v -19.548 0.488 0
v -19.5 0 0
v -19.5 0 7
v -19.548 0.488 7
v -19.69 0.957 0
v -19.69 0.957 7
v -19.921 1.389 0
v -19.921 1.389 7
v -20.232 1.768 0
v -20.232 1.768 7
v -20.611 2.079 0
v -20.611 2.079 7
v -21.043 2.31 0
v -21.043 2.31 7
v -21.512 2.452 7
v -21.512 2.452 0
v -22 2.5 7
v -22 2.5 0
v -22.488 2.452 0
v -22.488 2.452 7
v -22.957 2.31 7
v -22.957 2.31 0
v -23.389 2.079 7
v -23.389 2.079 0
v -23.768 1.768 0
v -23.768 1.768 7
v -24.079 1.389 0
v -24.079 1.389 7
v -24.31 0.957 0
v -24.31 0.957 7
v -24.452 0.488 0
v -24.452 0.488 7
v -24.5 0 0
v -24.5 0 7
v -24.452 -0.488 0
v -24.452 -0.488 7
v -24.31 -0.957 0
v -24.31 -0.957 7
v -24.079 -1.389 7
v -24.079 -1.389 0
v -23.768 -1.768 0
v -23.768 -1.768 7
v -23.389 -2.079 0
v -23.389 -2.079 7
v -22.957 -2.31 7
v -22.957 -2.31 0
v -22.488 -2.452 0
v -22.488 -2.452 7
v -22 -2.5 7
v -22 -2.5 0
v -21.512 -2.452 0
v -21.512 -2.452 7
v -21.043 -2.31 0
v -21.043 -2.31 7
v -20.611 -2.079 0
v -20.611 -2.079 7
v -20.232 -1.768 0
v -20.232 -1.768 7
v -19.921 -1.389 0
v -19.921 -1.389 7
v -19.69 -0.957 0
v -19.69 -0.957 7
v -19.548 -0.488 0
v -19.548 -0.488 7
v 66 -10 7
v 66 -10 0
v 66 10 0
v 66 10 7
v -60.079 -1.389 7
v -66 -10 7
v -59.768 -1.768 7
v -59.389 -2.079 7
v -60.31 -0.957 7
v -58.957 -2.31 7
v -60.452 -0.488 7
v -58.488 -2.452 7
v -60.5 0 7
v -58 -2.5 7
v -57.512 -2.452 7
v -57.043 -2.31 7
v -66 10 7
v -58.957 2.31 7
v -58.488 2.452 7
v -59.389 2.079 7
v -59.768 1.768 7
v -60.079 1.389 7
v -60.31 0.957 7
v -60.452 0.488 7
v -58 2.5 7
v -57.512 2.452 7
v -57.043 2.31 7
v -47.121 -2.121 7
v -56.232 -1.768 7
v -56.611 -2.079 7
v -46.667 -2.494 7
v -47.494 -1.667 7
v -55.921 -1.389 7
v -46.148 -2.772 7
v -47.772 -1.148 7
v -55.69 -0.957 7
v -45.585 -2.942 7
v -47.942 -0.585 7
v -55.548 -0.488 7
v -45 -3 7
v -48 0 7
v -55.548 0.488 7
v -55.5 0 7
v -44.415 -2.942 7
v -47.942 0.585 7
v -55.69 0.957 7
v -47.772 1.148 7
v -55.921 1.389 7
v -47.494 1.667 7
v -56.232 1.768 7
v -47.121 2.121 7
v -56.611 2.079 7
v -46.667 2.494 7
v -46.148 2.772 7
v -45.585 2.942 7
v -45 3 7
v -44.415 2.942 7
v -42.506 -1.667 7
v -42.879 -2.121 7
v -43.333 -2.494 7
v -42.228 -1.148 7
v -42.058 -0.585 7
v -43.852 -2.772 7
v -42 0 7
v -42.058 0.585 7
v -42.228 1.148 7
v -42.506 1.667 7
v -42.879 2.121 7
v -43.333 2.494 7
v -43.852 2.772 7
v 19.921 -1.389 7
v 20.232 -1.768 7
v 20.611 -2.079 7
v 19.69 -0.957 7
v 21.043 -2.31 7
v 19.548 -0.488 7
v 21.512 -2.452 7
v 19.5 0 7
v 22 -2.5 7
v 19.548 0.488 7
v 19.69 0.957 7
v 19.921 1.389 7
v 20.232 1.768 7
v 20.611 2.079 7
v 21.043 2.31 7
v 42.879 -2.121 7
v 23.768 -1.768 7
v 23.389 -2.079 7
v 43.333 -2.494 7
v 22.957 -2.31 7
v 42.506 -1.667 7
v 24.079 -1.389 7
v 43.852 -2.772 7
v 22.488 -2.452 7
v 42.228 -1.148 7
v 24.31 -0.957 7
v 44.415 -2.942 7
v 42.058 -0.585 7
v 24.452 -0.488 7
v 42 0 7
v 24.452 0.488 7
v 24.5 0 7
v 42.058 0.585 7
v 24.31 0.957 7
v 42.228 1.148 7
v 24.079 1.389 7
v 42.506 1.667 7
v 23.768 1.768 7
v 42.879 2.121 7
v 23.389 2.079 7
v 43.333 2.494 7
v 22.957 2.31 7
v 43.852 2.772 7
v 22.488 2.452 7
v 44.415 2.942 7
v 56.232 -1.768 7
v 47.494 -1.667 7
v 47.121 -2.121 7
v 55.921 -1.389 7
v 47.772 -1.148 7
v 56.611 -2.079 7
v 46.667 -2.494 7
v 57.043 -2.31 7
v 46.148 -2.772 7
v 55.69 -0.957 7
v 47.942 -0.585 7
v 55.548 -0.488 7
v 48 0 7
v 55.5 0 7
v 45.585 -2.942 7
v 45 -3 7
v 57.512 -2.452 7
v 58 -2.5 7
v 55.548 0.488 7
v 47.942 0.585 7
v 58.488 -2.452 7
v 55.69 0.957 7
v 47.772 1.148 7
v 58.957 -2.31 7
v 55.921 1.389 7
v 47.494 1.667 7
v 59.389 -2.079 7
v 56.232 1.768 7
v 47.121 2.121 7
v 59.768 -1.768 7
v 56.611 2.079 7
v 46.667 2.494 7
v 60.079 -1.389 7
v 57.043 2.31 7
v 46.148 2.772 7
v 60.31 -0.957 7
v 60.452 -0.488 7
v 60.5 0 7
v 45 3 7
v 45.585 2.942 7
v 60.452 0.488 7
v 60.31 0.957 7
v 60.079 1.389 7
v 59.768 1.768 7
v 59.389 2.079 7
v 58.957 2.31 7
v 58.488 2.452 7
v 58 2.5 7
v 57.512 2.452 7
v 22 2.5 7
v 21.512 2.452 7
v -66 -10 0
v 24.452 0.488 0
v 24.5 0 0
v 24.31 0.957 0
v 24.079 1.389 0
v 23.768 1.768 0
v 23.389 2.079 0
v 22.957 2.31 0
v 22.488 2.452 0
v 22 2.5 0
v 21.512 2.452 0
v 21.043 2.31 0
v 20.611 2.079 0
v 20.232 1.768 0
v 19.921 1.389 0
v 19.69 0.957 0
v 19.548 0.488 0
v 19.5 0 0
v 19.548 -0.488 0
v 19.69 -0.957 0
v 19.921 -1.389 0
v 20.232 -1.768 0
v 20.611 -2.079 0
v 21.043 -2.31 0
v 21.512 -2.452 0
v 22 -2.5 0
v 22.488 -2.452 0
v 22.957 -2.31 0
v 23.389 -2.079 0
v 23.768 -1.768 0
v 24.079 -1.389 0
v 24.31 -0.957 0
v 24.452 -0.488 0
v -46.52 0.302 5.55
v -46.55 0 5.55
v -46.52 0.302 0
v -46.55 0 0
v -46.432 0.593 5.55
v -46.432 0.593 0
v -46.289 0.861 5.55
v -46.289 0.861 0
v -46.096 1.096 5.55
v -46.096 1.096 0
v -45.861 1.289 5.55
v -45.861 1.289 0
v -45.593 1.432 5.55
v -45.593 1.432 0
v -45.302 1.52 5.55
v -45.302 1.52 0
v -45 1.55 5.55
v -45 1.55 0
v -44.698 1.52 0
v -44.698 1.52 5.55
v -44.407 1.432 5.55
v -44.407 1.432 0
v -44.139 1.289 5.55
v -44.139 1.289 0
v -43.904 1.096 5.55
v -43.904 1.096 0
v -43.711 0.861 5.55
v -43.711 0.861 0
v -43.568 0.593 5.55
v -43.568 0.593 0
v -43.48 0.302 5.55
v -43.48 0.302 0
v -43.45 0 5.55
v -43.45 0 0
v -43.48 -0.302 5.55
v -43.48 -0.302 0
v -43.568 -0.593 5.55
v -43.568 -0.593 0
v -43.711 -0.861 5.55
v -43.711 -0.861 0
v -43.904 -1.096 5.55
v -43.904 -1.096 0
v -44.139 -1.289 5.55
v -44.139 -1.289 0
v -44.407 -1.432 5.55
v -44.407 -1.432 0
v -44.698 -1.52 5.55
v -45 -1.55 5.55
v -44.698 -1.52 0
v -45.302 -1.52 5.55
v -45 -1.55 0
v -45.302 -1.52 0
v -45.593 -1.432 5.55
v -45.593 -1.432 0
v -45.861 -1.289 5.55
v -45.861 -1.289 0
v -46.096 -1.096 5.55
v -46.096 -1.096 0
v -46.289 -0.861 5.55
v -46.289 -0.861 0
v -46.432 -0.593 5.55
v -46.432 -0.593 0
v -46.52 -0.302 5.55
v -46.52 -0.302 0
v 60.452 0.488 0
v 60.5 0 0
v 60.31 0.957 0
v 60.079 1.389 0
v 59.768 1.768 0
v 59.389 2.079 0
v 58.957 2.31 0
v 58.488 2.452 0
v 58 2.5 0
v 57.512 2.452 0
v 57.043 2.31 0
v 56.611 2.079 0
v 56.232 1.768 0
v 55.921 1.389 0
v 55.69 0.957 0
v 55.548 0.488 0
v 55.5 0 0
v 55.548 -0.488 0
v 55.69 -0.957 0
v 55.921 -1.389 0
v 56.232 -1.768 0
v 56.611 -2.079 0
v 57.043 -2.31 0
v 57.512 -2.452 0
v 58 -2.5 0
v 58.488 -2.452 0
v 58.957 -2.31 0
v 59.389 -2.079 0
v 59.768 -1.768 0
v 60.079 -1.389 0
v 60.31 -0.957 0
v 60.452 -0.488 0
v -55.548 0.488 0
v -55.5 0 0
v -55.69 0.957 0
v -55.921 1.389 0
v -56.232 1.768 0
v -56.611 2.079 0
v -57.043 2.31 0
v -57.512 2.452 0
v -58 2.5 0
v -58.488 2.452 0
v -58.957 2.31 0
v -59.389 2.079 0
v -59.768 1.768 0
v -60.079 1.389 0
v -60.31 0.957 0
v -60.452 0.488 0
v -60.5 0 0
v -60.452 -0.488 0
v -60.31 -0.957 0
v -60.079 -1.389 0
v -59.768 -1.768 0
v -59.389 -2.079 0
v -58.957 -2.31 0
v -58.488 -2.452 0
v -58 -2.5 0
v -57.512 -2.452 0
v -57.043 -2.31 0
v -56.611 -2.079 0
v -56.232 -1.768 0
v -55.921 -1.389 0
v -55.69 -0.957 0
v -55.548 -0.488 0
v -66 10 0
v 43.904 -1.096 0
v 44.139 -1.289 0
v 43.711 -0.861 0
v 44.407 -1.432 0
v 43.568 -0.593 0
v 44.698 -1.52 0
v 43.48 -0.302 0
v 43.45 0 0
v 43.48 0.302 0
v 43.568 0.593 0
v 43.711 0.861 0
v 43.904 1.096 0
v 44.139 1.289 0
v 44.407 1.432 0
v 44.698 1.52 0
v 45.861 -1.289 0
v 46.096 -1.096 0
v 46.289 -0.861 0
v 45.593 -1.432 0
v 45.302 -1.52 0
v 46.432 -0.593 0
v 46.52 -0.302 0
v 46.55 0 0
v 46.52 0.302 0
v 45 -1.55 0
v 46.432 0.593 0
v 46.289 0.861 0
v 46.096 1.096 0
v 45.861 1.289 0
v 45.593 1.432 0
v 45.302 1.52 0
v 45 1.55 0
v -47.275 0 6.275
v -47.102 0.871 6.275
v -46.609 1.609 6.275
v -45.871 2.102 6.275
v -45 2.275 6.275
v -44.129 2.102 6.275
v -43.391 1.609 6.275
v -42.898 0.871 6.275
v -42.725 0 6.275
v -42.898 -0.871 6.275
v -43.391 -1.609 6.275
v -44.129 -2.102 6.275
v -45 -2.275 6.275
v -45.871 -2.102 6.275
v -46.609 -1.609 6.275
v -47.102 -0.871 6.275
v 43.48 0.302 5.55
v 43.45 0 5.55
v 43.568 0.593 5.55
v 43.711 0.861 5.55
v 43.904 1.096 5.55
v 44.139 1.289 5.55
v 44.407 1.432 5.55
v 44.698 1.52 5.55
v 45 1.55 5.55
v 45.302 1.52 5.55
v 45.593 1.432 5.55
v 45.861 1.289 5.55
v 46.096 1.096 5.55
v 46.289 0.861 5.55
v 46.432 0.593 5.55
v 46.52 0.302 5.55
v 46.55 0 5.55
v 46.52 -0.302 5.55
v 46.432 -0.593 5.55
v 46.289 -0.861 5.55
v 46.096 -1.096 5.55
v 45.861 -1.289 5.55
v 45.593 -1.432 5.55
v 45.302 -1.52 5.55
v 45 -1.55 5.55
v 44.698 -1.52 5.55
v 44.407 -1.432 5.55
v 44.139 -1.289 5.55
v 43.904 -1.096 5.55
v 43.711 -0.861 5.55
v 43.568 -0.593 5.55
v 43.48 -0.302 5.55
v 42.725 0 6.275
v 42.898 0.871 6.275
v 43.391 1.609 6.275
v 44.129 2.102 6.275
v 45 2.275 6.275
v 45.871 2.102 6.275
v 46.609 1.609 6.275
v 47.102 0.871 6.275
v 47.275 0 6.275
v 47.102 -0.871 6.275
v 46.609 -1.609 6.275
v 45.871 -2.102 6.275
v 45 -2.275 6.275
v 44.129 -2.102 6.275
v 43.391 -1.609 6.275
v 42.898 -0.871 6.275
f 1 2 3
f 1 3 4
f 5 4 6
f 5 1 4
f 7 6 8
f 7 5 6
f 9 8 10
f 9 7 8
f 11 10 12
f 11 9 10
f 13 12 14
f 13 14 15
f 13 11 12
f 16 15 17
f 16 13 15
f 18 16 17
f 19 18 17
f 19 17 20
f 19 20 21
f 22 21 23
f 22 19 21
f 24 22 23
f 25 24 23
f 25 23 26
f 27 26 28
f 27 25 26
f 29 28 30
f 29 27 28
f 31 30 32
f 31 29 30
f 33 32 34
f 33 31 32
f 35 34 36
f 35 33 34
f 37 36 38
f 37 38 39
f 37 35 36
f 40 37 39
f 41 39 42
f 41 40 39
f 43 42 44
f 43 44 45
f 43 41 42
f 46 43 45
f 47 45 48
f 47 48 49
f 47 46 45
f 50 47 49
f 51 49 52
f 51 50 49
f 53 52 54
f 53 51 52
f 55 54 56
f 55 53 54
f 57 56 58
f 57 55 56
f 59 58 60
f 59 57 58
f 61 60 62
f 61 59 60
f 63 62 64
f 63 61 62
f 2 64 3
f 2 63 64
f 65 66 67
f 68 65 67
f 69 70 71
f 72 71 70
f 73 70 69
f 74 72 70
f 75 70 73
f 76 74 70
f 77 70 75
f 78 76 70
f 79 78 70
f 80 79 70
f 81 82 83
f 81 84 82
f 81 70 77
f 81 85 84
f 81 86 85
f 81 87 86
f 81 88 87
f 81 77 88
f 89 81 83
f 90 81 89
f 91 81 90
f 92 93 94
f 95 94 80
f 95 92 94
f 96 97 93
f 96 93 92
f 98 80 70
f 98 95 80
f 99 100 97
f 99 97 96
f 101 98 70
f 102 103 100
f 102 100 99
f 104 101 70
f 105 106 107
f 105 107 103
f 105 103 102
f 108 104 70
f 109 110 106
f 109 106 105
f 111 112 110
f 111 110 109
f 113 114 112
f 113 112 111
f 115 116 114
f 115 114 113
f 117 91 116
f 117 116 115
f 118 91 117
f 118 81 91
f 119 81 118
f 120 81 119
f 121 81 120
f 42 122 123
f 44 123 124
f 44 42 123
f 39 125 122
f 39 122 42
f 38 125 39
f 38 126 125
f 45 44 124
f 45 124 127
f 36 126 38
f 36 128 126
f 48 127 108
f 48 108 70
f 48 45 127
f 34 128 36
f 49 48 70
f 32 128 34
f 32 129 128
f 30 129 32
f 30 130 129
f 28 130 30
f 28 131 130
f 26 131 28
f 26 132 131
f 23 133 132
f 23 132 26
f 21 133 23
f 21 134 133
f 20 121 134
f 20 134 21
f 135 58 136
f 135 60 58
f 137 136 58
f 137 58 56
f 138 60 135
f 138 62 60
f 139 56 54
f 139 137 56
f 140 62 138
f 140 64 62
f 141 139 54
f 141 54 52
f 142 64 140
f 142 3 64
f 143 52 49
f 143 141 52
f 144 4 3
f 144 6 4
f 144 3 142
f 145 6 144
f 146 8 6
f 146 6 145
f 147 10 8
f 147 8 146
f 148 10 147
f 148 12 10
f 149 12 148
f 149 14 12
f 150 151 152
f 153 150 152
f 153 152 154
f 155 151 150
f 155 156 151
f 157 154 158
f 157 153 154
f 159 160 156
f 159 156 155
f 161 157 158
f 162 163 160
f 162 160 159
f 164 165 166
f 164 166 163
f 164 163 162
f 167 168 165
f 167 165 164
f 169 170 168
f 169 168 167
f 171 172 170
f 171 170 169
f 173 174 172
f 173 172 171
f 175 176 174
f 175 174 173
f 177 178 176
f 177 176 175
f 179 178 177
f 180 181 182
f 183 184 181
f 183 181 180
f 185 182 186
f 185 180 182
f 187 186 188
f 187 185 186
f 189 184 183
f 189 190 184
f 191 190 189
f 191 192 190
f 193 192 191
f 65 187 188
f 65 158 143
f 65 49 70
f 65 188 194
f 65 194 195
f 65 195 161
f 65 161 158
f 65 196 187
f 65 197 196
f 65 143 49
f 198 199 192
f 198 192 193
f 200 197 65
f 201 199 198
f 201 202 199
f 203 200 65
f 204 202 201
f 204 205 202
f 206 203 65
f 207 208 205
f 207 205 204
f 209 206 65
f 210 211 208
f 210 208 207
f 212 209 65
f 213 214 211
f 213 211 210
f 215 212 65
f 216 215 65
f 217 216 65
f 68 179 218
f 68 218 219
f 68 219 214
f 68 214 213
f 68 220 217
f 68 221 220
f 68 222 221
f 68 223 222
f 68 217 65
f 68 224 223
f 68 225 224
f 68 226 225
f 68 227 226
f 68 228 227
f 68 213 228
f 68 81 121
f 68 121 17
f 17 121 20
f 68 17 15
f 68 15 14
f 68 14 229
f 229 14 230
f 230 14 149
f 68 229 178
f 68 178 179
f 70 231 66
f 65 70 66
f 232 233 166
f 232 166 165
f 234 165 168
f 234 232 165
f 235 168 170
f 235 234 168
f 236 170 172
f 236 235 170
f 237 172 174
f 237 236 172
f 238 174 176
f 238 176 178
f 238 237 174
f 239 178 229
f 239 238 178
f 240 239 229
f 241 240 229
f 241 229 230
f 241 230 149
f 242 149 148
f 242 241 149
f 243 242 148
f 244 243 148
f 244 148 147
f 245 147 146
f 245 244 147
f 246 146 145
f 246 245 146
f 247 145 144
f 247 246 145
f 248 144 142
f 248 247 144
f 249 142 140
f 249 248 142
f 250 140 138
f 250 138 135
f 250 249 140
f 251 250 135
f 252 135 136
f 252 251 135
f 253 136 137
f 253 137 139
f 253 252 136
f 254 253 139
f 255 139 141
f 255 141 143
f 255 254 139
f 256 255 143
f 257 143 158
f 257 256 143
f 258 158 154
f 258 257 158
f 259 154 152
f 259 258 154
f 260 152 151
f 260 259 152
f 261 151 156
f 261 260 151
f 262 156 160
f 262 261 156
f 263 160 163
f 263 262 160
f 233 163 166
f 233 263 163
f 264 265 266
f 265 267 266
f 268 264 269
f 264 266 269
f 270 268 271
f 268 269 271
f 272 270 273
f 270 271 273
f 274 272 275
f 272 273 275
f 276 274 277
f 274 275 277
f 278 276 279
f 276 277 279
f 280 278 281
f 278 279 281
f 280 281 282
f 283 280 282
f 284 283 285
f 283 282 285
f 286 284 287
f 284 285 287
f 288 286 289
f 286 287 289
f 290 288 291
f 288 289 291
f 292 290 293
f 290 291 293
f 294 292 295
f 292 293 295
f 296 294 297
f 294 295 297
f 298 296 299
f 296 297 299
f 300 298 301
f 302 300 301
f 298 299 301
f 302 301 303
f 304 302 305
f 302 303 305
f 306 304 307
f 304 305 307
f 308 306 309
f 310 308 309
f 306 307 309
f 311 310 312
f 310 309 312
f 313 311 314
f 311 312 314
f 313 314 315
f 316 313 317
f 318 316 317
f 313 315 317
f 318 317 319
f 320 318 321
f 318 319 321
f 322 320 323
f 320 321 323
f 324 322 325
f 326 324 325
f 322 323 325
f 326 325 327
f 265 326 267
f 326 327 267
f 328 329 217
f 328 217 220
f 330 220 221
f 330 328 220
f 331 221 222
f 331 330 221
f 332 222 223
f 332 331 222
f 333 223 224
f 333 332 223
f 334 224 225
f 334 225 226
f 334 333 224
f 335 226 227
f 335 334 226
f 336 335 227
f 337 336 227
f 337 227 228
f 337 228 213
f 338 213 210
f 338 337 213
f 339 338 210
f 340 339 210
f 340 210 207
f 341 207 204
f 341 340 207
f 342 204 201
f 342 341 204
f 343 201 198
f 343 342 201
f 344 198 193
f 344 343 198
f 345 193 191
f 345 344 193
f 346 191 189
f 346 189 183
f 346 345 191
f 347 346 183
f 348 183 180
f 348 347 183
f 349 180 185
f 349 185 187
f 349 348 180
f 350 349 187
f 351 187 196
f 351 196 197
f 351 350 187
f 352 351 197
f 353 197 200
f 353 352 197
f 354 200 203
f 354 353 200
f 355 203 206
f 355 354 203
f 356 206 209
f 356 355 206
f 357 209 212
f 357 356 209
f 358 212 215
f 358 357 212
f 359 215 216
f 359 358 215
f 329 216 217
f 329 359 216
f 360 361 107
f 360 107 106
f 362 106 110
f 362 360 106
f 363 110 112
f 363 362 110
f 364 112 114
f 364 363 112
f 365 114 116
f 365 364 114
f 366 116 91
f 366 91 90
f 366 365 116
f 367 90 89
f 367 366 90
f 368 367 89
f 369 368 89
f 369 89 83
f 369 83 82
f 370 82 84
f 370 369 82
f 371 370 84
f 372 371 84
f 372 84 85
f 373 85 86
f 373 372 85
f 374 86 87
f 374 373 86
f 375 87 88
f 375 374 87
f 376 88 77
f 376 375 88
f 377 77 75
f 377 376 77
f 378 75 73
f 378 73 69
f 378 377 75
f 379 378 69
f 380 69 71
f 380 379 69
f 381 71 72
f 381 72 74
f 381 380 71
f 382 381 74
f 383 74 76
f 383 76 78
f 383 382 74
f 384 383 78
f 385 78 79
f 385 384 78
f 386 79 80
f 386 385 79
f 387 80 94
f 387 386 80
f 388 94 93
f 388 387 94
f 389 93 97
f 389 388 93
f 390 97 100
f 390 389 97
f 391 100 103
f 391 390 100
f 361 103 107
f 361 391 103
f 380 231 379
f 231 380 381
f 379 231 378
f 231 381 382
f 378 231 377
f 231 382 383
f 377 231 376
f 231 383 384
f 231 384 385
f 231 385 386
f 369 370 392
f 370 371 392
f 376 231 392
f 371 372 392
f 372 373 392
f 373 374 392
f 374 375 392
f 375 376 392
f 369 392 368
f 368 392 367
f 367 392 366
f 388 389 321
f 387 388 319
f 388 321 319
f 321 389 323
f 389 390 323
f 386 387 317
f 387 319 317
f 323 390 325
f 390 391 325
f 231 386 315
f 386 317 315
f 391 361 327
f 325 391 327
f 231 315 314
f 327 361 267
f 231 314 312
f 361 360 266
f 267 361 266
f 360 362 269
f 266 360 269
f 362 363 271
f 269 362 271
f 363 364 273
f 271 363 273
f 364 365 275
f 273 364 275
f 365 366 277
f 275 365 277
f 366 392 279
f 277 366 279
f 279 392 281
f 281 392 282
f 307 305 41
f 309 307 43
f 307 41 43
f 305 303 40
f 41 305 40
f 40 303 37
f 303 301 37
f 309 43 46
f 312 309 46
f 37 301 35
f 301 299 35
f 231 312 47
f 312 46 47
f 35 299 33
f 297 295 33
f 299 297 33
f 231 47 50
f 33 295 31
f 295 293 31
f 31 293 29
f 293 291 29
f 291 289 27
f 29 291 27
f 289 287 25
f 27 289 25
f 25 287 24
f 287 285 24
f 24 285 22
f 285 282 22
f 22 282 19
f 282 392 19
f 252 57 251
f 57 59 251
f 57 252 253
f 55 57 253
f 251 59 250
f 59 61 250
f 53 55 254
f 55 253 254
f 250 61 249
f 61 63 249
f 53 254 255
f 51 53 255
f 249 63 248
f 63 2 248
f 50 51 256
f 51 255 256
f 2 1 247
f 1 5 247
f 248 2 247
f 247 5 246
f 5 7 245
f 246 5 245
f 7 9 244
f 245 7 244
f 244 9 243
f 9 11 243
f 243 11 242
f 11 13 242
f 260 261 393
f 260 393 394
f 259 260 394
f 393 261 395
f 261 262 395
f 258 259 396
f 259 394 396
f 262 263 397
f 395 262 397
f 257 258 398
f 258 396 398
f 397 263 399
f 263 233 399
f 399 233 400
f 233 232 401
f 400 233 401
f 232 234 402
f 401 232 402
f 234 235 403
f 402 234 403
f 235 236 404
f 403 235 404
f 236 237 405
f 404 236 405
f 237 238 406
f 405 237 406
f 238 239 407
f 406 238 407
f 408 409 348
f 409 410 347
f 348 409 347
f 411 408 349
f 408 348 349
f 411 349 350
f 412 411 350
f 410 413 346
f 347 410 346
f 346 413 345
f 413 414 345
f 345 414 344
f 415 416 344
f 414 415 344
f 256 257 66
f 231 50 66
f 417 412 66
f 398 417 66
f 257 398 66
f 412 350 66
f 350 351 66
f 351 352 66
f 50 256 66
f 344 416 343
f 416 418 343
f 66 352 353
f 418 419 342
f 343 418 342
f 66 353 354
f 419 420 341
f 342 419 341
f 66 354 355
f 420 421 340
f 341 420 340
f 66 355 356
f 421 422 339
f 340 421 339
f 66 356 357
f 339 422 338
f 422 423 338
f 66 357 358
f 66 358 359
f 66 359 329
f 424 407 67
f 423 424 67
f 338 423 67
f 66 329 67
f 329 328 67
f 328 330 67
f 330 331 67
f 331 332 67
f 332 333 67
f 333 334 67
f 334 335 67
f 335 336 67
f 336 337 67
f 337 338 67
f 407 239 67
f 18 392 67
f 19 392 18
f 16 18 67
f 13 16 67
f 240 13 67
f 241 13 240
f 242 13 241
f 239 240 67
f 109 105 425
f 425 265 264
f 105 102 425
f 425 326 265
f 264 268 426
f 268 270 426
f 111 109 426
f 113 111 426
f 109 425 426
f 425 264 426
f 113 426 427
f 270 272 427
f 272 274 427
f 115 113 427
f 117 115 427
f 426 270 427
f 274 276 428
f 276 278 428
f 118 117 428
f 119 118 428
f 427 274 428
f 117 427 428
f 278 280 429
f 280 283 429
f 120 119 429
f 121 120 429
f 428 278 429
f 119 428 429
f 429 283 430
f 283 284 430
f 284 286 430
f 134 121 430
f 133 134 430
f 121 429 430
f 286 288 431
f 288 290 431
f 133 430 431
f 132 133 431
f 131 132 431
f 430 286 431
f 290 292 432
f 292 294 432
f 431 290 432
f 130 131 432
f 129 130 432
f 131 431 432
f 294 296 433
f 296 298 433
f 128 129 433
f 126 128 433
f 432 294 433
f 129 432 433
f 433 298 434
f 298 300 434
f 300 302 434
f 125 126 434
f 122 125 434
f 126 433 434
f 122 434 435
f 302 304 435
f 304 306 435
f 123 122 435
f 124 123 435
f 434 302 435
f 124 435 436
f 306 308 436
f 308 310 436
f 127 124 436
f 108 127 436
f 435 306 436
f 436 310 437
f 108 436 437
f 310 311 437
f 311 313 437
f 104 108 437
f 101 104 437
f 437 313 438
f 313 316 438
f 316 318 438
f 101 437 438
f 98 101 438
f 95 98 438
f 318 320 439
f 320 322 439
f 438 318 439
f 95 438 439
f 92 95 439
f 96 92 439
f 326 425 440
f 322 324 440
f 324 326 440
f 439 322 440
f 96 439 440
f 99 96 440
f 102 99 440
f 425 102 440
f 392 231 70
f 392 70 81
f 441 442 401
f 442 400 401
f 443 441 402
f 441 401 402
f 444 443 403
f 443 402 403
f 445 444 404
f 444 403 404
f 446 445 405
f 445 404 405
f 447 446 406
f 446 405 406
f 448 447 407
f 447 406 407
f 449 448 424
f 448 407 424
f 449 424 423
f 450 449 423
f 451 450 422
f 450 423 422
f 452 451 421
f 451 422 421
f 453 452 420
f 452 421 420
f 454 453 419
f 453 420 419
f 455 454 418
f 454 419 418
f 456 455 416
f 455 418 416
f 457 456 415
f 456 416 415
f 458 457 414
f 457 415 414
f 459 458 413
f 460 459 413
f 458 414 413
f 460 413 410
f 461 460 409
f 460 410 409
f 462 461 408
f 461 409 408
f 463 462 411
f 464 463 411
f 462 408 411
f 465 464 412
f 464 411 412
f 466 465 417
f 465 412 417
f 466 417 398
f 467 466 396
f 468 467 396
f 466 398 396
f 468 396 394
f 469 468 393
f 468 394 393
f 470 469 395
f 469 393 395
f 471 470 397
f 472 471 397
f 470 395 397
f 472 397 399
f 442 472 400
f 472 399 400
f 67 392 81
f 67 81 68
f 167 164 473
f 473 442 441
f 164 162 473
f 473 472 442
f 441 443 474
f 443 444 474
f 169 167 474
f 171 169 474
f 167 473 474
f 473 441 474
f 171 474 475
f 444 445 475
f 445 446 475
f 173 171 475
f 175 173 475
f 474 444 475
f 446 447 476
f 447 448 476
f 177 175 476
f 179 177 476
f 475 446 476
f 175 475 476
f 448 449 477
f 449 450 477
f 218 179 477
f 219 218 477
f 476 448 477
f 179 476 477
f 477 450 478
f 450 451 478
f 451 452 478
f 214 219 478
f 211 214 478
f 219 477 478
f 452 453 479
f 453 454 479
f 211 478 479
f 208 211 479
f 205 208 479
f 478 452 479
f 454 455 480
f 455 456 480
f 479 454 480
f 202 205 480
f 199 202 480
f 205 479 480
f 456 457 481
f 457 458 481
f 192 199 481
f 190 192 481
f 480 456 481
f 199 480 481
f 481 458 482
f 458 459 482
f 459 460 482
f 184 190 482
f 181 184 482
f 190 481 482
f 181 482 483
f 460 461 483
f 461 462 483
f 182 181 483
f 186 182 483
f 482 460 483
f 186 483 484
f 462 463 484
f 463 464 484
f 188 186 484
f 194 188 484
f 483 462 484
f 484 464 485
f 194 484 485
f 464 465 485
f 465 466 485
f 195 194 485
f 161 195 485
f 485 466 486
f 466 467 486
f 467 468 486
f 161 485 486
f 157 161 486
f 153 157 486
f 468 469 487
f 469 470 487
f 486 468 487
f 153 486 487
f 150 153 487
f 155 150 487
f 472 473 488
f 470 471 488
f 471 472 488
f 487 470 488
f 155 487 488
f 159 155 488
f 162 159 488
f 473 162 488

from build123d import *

# Parameters (mm, degrees)
SKETCH1_W                                           = 132
SKETCH1_H                                           = 20
SKETCH1_R                                           = 1.5
SKETCH1_R_2                                         = 2.5
BOSS_EXTRUDE1_DEPTH                                 = 7
CSK_FOR_M4_COUNTERSUNK_FLAT_HEAD_SCREW1_D           = 3.1
CSK_FOR_M4_COUNTERSUNK_FLAT_HEAD_SCREW1_CSINK_D     = 6
CSK_FOR_M4_COUNTERSUNK_FLAT_HEAD_SCREW1_CSINK_ANGLE = 90


with BuildPart() as part:
    # Sketch1 → Boss-Extrude1 (new body)
    with BuildSketch(Plane.XY):
        Rectangle(SKETCH1_W, SKETCH1_H)
        with Locations((-45, 0)):
            Circle(SKETCH1_R, mode=Mode.SUBTRACT)
        with Locations((45, 0)):
            Circle(SKETCH1_R, mode=Mode.SUBTRACT)
        with Locations((-22, 0)):
            Circle(SKETCH1_R_2, mode=Mode.SUBTRACT)
        with Locations((22, 0)):
            Circle(SKETCH1_R_2, mode=Mode.SUBTRACT)
        with Locations((-58, 0)):
            Circle(SKETCH1_R_2, mode=Mode.SUBTRACT)
        with Locations((58, 0)):
            Circle(SKETCH1_R_2, mode=Mode.SUBTRACT)
    extrude(amount=BOSS_EXTRUDE1_DEPTH)

    # CSK for M4 Countersunk Flat Head Screw1 (through all)
    with Locations(Plane(origin=(-45, 0, 7), x_dir=(1, 0, 0), z_dir=(0, 0, 1))):
        with Locations((0, 0), (90, 0)):
            CounterSinkHole(CSK_FOR_M4_COUNTERSUNK_FLAT_HEAD_SCREW1_D / 2, CSK_FOR_M4_COUNTERSUNK_FLAT_HEAD_SCREW1_CSINK_D / 2, counter_sink_angle=CSK_FOR_M4_COUNTERSUNK_FLAT_HEAD_SCREW1_CSINK_ANGLE)


solid = part.part
